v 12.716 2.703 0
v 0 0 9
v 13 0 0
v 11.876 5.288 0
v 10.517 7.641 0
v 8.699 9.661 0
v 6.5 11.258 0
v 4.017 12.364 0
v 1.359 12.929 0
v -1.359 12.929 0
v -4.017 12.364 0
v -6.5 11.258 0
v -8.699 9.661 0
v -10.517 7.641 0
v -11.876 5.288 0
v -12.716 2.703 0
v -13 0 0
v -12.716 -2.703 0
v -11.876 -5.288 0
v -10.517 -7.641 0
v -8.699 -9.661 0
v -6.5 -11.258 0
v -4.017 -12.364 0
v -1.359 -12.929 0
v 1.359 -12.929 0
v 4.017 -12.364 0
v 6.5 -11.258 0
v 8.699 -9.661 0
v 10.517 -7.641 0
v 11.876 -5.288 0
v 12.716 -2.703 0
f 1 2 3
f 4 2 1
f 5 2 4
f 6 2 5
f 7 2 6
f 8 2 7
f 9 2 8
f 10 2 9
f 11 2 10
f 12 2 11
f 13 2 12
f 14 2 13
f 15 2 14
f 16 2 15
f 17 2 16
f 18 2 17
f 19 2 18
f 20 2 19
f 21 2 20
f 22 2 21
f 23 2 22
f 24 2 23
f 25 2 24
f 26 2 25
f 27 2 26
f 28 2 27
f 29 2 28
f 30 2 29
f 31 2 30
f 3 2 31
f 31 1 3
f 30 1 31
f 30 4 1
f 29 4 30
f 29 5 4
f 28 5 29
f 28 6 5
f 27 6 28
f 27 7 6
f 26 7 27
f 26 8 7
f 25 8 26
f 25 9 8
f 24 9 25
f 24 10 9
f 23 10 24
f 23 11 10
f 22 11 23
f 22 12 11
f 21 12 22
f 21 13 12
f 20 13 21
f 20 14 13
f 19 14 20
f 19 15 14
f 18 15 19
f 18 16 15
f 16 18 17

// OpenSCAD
// Generated by SolidPython 1.0.1 on 2020-07-29 00:39:25


cylinder(h = 9, r1 = 13, r2 = 0);
/***********************************************
*********      SolidPython code:      **********
************************************************
 
# import packages: SolidPython
from solid import *
from solid.utils import *
from itertools import chain, combinations


class Resize:

    def __init__(self, scad_file):
        self.scad_file = scad_file
        #self.scad_file = import_scad(scad_file)
        # cone/cylinder param:
        self.r1 = 0
        self.r2 = 0
        self.h = 0
        # rectangular prism param:
        self.w = 0
        self.l = 0
        # ellipse param:
        self.r = 0

    # import OpenScad code (file name corresponds to shape)


    # classify shape + parameters
    def assign(self, param1, param2, param3):
        if self.scad_file == 'cone.scad':
            self.r1 = param1
            self.r2 = param2
            self.h = param3
        elif self.scad_file == 'cylinder.scad':
            self.r1 = param1
            self.r2 = param2
            self.h = param3
        elif self.scad_file == 'rectangularPrism.scad':
            self.h = param1
            self.l = param2
            self.w = param3
        else:
            self.r = param1
            self.h = param2

    # resize parameters
    def iterate(self):
        x = range(3, 20, 2)
        i = 1
        if self.scad_file == 'cone.scad':
            tempList = list(combinations(x, 2))
            for temp in tempList:
                param1 = temp[0]
                param2 = temp[1]
                filepath = 'produced_scad_files/' + 'cone' + str(param1) + '_' + str(param2) + '_' + '.scad'
                scad_render_to_file(cylinder(h=param1, r1=param2, r2=0), filepath)

        elif self.scad_file == 'cylinder.scad':
            tempList = list(combinations(x, 3))
            for temp in tempList:
                param1 = temp[0]
                param2 = temp[1]
                filepath = 'produced_scad_files/' + 'cylinder' + str(param1) + '_' + str(param2) + '_' + '.scad'
                scad_render_to_file(cylinder(h=param1, r1=param2, r2=param2), filepath)

        elif self.scad_file == 'rectangularPrism.scad':
            tempList = list(combinations(x, 3))
            for temp in tempList:
                param1 = temp[0]
                param2 = temp[1]
                param3 = temp[2]
                filepath = 'produced_scad_files/' + 'rectangularPrism' + str(param1) + '_' + str(param2) + '_' + str(
                    param3) + '.scad'
                scad_render_to_file(cube(size=(param1, param2, param3)), filepath)

        elif self.scad_file == 'ellipse.scad':
            tempList = list(combinations(x, 4))
            for temp in tempList:
                param1 = temp[0]
                param2 = temp[1]
                param3 = temp[2]
                param4 = temp[3]
                filepath = 'produced_scad_files/' + 'ellipse' + str(param1) + '_' + str(param2) + '_' + str(param3) + '_' + str(param4) + '.scad'
                scad_render_to_file(scale([param1, param2, param3])(sphere(r=param4)), filepath)

    def render_to_scadfile(self):
        scad_render_to_file(scad, 'example.scad') 
 
************************************************/
